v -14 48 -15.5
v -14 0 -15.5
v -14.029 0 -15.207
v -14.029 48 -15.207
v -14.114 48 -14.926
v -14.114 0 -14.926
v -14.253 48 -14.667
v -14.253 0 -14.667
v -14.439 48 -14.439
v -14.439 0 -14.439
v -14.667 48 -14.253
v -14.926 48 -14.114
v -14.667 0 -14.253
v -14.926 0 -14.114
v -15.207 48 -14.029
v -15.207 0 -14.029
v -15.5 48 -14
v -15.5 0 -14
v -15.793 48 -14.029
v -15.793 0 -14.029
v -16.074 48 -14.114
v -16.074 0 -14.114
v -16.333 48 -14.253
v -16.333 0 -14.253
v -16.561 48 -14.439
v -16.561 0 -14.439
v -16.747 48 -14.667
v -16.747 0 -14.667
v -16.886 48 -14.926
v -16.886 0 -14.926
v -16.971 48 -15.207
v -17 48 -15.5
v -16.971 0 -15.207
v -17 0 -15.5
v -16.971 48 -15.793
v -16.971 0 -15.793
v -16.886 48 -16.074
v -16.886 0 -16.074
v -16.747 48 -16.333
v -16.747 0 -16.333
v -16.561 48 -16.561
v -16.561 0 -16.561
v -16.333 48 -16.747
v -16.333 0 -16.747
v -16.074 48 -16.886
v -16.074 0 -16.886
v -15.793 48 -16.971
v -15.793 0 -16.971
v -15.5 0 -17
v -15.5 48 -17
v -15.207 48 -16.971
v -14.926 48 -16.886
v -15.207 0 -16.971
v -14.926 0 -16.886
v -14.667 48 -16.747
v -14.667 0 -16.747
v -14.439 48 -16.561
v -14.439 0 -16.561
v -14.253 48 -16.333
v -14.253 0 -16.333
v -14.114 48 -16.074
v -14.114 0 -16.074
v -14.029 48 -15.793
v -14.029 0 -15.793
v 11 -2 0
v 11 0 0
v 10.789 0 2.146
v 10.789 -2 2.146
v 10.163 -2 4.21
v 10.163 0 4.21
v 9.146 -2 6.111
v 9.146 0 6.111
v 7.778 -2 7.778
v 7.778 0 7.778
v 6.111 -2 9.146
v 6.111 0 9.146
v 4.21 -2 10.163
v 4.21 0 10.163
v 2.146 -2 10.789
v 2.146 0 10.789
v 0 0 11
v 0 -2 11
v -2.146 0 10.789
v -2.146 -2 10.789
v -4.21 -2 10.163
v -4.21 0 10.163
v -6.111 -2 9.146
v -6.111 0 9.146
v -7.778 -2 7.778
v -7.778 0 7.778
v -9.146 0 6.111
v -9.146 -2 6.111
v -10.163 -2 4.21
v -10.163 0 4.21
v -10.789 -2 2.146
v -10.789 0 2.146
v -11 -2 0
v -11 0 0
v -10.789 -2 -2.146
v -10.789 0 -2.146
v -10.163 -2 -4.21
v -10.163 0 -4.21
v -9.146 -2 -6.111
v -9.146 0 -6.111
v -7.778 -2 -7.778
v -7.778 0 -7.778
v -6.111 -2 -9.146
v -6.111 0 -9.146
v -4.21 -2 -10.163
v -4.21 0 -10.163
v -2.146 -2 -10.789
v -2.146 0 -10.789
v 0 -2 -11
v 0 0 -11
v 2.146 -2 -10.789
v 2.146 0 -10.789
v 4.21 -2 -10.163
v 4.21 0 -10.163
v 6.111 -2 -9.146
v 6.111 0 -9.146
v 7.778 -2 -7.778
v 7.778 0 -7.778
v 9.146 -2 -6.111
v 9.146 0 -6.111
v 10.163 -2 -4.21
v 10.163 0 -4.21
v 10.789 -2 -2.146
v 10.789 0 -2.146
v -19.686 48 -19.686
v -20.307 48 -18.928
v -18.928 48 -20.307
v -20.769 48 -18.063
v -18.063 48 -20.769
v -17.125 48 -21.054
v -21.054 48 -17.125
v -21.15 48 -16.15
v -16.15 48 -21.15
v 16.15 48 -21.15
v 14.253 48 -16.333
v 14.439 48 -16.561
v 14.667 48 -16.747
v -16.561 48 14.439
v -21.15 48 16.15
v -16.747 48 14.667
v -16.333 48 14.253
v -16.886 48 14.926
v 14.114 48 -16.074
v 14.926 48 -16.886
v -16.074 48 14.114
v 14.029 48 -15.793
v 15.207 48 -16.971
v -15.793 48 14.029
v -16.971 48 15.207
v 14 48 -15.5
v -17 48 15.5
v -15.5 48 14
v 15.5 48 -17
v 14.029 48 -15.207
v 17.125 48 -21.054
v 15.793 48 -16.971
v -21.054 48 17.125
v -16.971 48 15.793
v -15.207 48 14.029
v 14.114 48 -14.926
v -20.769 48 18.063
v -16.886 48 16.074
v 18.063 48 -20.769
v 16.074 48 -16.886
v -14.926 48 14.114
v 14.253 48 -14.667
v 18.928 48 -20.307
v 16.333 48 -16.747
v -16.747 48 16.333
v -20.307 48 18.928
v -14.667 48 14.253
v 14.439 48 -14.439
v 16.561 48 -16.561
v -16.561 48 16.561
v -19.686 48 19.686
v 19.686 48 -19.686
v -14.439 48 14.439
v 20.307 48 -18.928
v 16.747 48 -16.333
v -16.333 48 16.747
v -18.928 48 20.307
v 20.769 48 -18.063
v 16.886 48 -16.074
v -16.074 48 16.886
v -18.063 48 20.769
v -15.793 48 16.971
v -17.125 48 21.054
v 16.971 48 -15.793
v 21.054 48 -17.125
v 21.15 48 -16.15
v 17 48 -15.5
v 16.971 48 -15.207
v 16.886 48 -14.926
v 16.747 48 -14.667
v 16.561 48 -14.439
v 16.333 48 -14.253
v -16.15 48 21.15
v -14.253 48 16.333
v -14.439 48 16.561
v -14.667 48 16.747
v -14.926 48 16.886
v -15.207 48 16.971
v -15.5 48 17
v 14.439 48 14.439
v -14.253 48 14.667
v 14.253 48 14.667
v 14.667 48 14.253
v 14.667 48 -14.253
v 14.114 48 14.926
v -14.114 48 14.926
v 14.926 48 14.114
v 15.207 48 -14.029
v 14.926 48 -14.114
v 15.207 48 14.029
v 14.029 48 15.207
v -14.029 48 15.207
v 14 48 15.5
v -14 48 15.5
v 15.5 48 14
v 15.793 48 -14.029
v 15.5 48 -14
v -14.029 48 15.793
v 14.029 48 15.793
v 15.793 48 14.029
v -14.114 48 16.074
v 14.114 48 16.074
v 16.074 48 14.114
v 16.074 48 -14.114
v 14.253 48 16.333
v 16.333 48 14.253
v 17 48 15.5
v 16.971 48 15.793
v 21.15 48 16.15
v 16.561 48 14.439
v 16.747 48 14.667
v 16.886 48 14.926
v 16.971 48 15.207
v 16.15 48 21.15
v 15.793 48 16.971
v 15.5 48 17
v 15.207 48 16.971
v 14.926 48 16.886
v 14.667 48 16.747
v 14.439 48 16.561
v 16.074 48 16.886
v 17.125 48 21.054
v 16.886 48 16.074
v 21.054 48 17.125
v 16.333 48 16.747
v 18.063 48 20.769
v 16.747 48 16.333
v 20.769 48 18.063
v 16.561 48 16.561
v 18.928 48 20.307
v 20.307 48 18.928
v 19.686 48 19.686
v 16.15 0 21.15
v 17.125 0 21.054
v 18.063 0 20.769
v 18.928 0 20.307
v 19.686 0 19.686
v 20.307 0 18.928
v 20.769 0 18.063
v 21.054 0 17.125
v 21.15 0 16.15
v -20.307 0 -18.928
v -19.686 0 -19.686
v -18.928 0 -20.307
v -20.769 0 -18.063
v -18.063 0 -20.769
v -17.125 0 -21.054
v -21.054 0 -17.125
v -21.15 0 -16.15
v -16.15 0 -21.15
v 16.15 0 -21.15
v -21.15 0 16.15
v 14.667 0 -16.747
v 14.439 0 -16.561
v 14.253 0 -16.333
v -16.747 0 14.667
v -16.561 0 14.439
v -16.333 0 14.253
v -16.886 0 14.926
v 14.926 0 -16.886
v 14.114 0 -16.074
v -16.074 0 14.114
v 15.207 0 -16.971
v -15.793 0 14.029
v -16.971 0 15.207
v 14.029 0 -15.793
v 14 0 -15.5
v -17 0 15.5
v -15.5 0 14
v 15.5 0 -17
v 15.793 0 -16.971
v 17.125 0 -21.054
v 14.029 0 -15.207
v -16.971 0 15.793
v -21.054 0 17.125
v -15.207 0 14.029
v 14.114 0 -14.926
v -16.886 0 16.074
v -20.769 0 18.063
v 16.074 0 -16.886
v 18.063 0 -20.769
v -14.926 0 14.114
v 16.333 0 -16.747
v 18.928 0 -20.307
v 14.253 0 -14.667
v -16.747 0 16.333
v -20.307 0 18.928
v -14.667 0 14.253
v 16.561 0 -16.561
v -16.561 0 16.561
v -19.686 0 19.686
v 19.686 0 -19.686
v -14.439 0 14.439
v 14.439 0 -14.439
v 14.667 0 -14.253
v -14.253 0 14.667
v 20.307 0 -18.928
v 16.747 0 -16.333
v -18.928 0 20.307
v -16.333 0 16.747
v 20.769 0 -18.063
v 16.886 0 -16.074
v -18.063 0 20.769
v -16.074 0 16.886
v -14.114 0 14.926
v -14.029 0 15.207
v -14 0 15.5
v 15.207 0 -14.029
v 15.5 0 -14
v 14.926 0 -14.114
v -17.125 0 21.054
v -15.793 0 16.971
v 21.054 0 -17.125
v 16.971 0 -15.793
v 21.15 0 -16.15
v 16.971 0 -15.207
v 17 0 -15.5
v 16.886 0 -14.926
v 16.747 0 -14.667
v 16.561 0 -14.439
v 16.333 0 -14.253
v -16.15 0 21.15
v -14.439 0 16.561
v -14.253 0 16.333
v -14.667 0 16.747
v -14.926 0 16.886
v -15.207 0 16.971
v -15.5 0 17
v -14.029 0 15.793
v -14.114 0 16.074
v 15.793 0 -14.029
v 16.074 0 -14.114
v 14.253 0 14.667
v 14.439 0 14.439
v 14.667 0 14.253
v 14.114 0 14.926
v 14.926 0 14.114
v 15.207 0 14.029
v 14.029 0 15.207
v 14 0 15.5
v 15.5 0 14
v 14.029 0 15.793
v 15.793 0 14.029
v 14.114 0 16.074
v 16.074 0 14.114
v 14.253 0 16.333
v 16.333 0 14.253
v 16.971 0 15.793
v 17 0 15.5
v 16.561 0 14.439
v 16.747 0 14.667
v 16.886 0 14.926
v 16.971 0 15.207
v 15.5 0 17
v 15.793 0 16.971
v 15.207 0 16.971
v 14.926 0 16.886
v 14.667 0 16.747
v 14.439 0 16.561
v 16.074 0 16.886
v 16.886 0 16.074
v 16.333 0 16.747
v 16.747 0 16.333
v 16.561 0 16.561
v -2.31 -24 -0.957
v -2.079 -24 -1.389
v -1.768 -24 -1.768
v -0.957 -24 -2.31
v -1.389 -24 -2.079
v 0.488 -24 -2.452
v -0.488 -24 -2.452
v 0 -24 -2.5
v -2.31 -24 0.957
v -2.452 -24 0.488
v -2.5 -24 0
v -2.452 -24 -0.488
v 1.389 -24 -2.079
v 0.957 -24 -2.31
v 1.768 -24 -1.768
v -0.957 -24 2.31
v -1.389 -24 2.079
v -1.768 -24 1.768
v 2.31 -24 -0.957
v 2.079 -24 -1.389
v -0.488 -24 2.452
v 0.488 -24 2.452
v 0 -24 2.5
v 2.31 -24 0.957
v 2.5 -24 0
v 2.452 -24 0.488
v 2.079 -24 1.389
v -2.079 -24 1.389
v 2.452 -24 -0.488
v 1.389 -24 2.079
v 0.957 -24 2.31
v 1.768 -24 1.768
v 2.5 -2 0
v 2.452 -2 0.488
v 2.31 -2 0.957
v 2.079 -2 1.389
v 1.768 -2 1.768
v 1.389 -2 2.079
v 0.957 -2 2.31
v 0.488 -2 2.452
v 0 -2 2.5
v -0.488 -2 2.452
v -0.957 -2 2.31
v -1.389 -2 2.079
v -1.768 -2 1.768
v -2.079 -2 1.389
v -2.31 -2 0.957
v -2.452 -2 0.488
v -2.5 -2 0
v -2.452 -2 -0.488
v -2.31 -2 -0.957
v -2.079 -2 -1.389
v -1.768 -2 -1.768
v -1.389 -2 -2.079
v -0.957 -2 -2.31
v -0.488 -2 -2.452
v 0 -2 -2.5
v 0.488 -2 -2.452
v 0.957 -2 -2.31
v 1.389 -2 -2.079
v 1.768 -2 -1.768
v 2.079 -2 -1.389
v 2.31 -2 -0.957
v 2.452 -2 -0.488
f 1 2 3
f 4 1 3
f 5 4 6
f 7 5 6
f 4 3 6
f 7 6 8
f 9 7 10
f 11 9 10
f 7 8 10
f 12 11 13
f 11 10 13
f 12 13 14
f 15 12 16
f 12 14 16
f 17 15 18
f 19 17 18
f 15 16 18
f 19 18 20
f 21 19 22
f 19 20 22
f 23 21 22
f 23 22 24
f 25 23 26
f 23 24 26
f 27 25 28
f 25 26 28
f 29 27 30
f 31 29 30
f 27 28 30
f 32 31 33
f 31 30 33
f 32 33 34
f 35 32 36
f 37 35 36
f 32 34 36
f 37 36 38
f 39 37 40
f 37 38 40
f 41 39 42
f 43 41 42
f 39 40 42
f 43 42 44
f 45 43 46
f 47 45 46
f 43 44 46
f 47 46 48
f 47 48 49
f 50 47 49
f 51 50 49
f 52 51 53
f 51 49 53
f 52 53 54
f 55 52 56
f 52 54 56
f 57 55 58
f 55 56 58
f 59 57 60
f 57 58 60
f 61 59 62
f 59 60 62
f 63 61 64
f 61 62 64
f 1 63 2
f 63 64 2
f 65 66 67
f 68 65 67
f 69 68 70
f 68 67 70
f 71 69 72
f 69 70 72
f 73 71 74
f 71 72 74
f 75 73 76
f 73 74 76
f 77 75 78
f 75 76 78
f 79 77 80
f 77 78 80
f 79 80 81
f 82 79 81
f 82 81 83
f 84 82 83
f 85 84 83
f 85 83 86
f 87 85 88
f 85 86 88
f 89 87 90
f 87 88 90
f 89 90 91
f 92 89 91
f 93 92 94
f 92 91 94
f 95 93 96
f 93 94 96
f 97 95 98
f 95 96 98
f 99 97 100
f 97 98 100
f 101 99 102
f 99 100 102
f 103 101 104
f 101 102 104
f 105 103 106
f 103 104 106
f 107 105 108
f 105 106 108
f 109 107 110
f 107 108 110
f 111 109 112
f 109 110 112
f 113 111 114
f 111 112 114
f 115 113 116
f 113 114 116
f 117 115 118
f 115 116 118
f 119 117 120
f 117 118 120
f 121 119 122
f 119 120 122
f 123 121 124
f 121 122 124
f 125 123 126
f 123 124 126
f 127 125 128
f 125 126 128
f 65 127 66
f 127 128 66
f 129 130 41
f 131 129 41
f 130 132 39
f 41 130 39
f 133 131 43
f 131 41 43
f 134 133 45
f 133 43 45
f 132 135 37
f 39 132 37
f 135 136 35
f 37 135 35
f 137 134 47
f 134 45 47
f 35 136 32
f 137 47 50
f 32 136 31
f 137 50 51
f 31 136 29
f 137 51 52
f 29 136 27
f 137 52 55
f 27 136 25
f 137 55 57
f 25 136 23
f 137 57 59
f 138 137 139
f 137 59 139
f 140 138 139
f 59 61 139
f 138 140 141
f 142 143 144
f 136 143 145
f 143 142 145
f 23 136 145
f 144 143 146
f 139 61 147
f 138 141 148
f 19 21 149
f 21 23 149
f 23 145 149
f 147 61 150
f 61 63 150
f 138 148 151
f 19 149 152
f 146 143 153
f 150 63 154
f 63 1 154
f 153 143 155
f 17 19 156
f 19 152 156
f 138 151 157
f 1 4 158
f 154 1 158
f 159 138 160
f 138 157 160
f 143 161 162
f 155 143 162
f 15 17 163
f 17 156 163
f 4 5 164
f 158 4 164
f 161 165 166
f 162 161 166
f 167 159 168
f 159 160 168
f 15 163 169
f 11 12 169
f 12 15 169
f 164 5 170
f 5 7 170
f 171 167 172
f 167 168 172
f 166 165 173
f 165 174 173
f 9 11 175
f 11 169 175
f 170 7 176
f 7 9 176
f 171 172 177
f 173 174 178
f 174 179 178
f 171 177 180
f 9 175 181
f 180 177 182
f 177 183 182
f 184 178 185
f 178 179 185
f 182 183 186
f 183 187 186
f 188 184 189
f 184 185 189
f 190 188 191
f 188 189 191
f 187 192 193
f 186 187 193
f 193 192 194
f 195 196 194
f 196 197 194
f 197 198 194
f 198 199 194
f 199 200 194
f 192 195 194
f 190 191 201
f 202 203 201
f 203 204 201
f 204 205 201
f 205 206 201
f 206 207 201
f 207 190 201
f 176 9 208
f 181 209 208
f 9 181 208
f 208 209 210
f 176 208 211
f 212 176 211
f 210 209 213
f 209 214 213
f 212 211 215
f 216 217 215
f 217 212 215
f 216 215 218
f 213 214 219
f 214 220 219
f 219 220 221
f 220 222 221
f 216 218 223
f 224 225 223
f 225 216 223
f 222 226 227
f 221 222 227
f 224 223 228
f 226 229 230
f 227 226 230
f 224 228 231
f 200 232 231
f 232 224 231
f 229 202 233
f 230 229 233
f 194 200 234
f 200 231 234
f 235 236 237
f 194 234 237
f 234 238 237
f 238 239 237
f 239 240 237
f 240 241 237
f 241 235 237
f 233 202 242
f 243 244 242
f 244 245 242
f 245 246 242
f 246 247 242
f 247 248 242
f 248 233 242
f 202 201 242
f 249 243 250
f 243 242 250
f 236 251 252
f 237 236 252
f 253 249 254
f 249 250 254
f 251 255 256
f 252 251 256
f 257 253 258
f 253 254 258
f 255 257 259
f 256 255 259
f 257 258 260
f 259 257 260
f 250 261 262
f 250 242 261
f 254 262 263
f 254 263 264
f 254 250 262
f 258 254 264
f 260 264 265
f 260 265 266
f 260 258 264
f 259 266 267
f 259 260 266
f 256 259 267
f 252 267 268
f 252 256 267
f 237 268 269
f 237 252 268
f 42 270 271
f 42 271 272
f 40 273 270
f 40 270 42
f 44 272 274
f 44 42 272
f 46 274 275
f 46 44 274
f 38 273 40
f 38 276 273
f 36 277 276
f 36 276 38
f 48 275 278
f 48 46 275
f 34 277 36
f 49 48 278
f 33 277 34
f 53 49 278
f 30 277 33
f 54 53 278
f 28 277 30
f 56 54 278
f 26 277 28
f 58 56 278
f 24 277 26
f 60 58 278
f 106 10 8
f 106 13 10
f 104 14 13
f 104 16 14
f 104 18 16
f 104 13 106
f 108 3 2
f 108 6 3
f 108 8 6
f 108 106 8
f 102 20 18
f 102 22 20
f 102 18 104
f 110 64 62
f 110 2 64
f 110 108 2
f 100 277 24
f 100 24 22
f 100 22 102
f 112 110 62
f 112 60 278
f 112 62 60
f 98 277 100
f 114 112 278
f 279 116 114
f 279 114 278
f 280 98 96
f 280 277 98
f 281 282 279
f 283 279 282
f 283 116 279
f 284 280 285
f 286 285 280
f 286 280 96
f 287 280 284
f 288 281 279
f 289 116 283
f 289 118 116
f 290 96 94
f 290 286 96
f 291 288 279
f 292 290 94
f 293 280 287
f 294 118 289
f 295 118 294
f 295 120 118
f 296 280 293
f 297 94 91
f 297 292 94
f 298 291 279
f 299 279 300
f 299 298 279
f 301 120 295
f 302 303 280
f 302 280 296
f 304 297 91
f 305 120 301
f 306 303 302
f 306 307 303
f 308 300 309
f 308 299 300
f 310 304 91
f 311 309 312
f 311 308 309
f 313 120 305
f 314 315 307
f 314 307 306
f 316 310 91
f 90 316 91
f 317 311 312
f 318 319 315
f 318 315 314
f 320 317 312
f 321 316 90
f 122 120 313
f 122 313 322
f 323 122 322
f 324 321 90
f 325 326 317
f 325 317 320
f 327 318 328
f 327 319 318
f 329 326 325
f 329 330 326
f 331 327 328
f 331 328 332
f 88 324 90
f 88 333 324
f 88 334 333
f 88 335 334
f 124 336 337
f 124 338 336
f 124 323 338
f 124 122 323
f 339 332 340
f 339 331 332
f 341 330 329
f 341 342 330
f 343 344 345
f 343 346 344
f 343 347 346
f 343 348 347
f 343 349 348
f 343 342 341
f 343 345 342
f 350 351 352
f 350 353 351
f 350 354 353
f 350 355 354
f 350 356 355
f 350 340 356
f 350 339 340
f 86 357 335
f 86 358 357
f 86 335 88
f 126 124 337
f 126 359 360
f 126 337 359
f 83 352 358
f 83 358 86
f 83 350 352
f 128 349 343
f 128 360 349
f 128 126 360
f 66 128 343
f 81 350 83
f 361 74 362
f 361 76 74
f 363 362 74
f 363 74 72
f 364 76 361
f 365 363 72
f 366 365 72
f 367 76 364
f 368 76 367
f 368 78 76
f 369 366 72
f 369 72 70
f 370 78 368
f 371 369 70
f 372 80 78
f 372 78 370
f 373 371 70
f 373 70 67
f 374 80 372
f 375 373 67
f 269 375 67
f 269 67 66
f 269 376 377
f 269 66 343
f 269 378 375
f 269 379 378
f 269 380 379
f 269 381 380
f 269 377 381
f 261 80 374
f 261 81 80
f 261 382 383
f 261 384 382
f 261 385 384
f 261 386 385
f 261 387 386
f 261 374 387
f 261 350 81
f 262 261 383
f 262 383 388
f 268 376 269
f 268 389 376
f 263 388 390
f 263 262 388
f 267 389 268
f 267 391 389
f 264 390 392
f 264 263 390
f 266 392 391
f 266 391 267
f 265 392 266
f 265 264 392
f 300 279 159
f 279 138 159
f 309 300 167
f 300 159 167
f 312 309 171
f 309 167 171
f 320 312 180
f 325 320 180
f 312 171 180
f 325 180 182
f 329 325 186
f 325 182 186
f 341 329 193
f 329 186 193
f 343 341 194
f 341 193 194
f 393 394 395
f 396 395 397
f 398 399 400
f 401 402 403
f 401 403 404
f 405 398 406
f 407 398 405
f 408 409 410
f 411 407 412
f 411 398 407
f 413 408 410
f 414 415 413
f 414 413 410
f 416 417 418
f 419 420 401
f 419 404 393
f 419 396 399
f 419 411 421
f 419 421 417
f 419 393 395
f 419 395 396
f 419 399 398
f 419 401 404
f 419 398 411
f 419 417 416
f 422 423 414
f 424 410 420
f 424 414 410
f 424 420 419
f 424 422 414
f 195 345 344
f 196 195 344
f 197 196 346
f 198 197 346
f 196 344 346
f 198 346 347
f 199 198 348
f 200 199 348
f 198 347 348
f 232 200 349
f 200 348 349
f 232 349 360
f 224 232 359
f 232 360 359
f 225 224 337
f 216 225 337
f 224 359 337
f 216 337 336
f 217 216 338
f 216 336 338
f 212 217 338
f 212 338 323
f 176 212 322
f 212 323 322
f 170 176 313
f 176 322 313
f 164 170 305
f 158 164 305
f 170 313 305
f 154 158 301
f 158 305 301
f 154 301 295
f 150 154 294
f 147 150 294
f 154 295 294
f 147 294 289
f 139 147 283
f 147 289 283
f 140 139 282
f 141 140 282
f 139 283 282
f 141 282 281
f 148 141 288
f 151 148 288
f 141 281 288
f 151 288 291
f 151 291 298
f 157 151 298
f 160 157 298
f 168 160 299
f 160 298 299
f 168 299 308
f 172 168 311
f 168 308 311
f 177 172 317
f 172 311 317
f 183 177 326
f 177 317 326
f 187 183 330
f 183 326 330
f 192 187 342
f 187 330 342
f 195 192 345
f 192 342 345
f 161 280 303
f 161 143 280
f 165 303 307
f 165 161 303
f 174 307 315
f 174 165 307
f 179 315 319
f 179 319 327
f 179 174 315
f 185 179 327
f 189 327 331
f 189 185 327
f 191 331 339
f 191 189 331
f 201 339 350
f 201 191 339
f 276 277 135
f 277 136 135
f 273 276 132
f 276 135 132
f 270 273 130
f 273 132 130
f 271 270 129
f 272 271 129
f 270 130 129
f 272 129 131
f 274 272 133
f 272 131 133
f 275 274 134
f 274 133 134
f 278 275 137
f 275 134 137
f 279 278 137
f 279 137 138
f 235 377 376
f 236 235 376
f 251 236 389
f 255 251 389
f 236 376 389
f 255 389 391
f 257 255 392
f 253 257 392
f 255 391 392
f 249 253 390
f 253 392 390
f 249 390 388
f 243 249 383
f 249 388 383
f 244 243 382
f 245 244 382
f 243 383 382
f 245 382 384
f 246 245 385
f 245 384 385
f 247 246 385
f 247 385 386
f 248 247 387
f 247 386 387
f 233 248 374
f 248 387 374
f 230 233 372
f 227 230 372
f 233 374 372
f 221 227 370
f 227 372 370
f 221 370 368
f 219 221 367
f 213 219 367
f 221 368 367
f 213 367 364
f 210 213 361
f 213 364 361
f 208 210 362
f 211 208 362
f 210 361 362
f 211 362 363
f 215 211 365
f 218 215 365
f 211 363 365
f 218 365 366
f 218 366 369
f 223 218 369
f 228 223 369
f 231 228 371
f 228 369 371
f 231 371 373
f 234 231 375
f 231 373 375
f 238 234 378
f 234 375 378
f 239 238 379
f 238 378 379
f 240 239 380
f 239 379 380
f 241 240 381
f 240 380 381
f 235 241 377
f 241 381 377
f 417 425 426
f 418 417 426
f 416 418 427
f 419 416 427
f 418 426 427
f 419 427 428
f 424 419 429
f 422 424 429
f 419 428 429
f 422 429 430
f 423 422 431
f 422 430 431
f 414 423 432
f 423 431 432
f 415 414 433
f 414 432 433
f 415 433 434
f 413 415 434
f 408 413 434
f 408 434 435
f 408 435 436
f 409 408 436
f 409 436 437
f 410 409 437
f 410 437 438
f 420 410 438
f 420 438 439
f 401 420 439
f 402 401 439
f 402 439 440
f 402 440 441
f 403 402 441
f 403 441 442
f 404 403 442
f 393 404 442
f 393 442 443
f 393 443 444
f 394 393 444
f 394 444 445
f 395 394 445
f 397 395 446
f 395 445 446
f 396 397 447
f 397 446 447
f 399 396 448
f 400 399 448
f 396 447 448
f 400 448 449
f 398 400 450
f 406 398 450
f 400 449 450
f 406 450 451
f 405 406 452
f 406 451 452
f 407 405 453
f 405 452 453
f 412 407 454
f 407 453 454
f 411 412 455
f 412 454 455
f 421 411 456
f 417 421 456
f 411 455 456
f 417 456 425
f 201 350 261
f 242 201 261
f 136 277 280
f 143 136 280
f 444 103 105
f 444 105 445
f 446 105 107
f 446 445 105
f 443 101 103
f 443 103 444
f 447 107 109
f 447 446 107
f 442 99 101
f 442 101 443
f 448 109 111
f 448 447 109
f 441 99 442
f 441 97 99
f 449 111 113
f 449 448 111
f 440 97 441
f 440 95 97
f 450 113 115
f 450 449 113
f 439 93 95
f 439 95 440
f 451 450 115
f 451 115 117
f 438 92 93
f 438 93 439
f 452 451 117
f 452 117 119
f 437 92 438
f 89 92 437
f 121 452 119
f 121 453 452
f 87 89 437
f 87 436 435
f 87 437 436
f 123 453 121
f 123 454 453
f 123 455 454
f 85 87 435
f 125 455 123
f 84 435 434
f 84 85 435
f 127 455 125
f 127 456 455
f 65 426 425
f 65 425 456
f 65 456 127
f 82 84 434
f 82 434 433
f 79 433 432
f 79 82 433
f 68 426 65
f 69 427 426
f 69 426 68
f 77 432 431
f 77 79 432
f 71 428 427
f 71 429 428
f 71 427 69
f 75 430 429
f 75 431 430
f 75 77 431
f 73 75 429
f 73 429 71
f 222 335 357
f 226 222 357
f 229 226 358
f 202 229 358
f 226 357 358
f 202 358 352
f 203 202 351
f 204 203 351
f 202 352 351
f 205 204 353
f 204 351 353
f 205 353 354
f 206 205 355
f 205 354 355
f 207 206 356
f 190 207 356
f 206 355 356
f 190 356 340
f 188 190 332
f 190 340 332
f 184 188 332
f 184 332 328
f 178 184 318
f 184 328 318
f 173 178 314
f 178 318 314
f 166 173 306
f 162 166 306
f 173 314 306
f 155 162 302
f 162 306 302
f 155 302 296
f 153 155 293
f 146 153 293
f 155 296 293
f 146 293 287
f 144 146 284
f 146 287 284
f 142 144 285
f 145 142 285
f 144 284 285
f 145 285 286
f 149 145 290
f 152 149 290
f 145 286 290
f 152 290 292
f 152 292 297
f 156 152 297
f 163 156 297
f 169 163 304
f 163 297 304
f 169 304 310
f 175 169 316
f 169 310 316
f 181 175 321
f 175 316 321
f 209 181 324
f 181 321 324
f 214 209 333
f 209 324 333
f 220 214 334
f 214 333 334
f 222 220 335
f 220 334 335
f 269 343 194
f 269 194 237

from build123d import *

# Parameters (mm, degrees)
F0_R     = 2.5
F1_DEPTH = 24
F0_R_2   = 11
F2_DEPTH = 2
F0_W     = 42.3
F0_H     = 42.3
F0_R_3   = 1.5
F3_DEPTH = 48
F4_R     = 5


with BuildPart() as f1:
    # F0 (on Front) → F1 (new body)
    with BuildSketch(Plane.XZ):
        Circle(F0_R)
    extrude(amount=F1_DEPTH)

    # F0 (on Front) → F2 (join)
    with BuildSketch(Plane.XZ):
        Circle(F0_R_2)
        Circle(F0_R, mode=Mode.SUBTRACT)
    extrude(amount=F2_DEPTH)

    # F0 (on Front) → F3 (join)
    with BuildSketch(Plane.XZ):
        Rectangle(F0_W, F0_H)
        with Locations((-15.5, -15.5)):
            Circle(F0_R_3, mode=Mode.SUBTRACT)
        with Locations((15.5, -15.5)):
            Circle(F0_R_3, mode=Mode.SUBTRACT)
        with Locations((-15.5, 15.5)):
            Circle(F0_R_3, mode=Mode.SUBTRACT)
        Circle(F0_R_2, mode=Mode.SUBTRACT)
        with Locations((15.5, 15.5)):
            Circle(F0_R_3, mode=Mode.SUBTRACT)
        Circle(F0_R_2)
        Circle(F0_R, mode=Mode.SUBTRACT)
        Circle(F0_R)
    extrude(amount=-F3_DEPTH)

    # F4
    f4_edges = [f1.edges().sort_by_distance(p)[0] for p in [
        (21.15, 24, 21.15),
        (21.15, 24, -21.15),
        (-21.15, 24, -21.15),
        (-21.15, 24, 21.15),
    ]]
    fillet(f4_edges, radius=F4_R)


solid = f1.part
